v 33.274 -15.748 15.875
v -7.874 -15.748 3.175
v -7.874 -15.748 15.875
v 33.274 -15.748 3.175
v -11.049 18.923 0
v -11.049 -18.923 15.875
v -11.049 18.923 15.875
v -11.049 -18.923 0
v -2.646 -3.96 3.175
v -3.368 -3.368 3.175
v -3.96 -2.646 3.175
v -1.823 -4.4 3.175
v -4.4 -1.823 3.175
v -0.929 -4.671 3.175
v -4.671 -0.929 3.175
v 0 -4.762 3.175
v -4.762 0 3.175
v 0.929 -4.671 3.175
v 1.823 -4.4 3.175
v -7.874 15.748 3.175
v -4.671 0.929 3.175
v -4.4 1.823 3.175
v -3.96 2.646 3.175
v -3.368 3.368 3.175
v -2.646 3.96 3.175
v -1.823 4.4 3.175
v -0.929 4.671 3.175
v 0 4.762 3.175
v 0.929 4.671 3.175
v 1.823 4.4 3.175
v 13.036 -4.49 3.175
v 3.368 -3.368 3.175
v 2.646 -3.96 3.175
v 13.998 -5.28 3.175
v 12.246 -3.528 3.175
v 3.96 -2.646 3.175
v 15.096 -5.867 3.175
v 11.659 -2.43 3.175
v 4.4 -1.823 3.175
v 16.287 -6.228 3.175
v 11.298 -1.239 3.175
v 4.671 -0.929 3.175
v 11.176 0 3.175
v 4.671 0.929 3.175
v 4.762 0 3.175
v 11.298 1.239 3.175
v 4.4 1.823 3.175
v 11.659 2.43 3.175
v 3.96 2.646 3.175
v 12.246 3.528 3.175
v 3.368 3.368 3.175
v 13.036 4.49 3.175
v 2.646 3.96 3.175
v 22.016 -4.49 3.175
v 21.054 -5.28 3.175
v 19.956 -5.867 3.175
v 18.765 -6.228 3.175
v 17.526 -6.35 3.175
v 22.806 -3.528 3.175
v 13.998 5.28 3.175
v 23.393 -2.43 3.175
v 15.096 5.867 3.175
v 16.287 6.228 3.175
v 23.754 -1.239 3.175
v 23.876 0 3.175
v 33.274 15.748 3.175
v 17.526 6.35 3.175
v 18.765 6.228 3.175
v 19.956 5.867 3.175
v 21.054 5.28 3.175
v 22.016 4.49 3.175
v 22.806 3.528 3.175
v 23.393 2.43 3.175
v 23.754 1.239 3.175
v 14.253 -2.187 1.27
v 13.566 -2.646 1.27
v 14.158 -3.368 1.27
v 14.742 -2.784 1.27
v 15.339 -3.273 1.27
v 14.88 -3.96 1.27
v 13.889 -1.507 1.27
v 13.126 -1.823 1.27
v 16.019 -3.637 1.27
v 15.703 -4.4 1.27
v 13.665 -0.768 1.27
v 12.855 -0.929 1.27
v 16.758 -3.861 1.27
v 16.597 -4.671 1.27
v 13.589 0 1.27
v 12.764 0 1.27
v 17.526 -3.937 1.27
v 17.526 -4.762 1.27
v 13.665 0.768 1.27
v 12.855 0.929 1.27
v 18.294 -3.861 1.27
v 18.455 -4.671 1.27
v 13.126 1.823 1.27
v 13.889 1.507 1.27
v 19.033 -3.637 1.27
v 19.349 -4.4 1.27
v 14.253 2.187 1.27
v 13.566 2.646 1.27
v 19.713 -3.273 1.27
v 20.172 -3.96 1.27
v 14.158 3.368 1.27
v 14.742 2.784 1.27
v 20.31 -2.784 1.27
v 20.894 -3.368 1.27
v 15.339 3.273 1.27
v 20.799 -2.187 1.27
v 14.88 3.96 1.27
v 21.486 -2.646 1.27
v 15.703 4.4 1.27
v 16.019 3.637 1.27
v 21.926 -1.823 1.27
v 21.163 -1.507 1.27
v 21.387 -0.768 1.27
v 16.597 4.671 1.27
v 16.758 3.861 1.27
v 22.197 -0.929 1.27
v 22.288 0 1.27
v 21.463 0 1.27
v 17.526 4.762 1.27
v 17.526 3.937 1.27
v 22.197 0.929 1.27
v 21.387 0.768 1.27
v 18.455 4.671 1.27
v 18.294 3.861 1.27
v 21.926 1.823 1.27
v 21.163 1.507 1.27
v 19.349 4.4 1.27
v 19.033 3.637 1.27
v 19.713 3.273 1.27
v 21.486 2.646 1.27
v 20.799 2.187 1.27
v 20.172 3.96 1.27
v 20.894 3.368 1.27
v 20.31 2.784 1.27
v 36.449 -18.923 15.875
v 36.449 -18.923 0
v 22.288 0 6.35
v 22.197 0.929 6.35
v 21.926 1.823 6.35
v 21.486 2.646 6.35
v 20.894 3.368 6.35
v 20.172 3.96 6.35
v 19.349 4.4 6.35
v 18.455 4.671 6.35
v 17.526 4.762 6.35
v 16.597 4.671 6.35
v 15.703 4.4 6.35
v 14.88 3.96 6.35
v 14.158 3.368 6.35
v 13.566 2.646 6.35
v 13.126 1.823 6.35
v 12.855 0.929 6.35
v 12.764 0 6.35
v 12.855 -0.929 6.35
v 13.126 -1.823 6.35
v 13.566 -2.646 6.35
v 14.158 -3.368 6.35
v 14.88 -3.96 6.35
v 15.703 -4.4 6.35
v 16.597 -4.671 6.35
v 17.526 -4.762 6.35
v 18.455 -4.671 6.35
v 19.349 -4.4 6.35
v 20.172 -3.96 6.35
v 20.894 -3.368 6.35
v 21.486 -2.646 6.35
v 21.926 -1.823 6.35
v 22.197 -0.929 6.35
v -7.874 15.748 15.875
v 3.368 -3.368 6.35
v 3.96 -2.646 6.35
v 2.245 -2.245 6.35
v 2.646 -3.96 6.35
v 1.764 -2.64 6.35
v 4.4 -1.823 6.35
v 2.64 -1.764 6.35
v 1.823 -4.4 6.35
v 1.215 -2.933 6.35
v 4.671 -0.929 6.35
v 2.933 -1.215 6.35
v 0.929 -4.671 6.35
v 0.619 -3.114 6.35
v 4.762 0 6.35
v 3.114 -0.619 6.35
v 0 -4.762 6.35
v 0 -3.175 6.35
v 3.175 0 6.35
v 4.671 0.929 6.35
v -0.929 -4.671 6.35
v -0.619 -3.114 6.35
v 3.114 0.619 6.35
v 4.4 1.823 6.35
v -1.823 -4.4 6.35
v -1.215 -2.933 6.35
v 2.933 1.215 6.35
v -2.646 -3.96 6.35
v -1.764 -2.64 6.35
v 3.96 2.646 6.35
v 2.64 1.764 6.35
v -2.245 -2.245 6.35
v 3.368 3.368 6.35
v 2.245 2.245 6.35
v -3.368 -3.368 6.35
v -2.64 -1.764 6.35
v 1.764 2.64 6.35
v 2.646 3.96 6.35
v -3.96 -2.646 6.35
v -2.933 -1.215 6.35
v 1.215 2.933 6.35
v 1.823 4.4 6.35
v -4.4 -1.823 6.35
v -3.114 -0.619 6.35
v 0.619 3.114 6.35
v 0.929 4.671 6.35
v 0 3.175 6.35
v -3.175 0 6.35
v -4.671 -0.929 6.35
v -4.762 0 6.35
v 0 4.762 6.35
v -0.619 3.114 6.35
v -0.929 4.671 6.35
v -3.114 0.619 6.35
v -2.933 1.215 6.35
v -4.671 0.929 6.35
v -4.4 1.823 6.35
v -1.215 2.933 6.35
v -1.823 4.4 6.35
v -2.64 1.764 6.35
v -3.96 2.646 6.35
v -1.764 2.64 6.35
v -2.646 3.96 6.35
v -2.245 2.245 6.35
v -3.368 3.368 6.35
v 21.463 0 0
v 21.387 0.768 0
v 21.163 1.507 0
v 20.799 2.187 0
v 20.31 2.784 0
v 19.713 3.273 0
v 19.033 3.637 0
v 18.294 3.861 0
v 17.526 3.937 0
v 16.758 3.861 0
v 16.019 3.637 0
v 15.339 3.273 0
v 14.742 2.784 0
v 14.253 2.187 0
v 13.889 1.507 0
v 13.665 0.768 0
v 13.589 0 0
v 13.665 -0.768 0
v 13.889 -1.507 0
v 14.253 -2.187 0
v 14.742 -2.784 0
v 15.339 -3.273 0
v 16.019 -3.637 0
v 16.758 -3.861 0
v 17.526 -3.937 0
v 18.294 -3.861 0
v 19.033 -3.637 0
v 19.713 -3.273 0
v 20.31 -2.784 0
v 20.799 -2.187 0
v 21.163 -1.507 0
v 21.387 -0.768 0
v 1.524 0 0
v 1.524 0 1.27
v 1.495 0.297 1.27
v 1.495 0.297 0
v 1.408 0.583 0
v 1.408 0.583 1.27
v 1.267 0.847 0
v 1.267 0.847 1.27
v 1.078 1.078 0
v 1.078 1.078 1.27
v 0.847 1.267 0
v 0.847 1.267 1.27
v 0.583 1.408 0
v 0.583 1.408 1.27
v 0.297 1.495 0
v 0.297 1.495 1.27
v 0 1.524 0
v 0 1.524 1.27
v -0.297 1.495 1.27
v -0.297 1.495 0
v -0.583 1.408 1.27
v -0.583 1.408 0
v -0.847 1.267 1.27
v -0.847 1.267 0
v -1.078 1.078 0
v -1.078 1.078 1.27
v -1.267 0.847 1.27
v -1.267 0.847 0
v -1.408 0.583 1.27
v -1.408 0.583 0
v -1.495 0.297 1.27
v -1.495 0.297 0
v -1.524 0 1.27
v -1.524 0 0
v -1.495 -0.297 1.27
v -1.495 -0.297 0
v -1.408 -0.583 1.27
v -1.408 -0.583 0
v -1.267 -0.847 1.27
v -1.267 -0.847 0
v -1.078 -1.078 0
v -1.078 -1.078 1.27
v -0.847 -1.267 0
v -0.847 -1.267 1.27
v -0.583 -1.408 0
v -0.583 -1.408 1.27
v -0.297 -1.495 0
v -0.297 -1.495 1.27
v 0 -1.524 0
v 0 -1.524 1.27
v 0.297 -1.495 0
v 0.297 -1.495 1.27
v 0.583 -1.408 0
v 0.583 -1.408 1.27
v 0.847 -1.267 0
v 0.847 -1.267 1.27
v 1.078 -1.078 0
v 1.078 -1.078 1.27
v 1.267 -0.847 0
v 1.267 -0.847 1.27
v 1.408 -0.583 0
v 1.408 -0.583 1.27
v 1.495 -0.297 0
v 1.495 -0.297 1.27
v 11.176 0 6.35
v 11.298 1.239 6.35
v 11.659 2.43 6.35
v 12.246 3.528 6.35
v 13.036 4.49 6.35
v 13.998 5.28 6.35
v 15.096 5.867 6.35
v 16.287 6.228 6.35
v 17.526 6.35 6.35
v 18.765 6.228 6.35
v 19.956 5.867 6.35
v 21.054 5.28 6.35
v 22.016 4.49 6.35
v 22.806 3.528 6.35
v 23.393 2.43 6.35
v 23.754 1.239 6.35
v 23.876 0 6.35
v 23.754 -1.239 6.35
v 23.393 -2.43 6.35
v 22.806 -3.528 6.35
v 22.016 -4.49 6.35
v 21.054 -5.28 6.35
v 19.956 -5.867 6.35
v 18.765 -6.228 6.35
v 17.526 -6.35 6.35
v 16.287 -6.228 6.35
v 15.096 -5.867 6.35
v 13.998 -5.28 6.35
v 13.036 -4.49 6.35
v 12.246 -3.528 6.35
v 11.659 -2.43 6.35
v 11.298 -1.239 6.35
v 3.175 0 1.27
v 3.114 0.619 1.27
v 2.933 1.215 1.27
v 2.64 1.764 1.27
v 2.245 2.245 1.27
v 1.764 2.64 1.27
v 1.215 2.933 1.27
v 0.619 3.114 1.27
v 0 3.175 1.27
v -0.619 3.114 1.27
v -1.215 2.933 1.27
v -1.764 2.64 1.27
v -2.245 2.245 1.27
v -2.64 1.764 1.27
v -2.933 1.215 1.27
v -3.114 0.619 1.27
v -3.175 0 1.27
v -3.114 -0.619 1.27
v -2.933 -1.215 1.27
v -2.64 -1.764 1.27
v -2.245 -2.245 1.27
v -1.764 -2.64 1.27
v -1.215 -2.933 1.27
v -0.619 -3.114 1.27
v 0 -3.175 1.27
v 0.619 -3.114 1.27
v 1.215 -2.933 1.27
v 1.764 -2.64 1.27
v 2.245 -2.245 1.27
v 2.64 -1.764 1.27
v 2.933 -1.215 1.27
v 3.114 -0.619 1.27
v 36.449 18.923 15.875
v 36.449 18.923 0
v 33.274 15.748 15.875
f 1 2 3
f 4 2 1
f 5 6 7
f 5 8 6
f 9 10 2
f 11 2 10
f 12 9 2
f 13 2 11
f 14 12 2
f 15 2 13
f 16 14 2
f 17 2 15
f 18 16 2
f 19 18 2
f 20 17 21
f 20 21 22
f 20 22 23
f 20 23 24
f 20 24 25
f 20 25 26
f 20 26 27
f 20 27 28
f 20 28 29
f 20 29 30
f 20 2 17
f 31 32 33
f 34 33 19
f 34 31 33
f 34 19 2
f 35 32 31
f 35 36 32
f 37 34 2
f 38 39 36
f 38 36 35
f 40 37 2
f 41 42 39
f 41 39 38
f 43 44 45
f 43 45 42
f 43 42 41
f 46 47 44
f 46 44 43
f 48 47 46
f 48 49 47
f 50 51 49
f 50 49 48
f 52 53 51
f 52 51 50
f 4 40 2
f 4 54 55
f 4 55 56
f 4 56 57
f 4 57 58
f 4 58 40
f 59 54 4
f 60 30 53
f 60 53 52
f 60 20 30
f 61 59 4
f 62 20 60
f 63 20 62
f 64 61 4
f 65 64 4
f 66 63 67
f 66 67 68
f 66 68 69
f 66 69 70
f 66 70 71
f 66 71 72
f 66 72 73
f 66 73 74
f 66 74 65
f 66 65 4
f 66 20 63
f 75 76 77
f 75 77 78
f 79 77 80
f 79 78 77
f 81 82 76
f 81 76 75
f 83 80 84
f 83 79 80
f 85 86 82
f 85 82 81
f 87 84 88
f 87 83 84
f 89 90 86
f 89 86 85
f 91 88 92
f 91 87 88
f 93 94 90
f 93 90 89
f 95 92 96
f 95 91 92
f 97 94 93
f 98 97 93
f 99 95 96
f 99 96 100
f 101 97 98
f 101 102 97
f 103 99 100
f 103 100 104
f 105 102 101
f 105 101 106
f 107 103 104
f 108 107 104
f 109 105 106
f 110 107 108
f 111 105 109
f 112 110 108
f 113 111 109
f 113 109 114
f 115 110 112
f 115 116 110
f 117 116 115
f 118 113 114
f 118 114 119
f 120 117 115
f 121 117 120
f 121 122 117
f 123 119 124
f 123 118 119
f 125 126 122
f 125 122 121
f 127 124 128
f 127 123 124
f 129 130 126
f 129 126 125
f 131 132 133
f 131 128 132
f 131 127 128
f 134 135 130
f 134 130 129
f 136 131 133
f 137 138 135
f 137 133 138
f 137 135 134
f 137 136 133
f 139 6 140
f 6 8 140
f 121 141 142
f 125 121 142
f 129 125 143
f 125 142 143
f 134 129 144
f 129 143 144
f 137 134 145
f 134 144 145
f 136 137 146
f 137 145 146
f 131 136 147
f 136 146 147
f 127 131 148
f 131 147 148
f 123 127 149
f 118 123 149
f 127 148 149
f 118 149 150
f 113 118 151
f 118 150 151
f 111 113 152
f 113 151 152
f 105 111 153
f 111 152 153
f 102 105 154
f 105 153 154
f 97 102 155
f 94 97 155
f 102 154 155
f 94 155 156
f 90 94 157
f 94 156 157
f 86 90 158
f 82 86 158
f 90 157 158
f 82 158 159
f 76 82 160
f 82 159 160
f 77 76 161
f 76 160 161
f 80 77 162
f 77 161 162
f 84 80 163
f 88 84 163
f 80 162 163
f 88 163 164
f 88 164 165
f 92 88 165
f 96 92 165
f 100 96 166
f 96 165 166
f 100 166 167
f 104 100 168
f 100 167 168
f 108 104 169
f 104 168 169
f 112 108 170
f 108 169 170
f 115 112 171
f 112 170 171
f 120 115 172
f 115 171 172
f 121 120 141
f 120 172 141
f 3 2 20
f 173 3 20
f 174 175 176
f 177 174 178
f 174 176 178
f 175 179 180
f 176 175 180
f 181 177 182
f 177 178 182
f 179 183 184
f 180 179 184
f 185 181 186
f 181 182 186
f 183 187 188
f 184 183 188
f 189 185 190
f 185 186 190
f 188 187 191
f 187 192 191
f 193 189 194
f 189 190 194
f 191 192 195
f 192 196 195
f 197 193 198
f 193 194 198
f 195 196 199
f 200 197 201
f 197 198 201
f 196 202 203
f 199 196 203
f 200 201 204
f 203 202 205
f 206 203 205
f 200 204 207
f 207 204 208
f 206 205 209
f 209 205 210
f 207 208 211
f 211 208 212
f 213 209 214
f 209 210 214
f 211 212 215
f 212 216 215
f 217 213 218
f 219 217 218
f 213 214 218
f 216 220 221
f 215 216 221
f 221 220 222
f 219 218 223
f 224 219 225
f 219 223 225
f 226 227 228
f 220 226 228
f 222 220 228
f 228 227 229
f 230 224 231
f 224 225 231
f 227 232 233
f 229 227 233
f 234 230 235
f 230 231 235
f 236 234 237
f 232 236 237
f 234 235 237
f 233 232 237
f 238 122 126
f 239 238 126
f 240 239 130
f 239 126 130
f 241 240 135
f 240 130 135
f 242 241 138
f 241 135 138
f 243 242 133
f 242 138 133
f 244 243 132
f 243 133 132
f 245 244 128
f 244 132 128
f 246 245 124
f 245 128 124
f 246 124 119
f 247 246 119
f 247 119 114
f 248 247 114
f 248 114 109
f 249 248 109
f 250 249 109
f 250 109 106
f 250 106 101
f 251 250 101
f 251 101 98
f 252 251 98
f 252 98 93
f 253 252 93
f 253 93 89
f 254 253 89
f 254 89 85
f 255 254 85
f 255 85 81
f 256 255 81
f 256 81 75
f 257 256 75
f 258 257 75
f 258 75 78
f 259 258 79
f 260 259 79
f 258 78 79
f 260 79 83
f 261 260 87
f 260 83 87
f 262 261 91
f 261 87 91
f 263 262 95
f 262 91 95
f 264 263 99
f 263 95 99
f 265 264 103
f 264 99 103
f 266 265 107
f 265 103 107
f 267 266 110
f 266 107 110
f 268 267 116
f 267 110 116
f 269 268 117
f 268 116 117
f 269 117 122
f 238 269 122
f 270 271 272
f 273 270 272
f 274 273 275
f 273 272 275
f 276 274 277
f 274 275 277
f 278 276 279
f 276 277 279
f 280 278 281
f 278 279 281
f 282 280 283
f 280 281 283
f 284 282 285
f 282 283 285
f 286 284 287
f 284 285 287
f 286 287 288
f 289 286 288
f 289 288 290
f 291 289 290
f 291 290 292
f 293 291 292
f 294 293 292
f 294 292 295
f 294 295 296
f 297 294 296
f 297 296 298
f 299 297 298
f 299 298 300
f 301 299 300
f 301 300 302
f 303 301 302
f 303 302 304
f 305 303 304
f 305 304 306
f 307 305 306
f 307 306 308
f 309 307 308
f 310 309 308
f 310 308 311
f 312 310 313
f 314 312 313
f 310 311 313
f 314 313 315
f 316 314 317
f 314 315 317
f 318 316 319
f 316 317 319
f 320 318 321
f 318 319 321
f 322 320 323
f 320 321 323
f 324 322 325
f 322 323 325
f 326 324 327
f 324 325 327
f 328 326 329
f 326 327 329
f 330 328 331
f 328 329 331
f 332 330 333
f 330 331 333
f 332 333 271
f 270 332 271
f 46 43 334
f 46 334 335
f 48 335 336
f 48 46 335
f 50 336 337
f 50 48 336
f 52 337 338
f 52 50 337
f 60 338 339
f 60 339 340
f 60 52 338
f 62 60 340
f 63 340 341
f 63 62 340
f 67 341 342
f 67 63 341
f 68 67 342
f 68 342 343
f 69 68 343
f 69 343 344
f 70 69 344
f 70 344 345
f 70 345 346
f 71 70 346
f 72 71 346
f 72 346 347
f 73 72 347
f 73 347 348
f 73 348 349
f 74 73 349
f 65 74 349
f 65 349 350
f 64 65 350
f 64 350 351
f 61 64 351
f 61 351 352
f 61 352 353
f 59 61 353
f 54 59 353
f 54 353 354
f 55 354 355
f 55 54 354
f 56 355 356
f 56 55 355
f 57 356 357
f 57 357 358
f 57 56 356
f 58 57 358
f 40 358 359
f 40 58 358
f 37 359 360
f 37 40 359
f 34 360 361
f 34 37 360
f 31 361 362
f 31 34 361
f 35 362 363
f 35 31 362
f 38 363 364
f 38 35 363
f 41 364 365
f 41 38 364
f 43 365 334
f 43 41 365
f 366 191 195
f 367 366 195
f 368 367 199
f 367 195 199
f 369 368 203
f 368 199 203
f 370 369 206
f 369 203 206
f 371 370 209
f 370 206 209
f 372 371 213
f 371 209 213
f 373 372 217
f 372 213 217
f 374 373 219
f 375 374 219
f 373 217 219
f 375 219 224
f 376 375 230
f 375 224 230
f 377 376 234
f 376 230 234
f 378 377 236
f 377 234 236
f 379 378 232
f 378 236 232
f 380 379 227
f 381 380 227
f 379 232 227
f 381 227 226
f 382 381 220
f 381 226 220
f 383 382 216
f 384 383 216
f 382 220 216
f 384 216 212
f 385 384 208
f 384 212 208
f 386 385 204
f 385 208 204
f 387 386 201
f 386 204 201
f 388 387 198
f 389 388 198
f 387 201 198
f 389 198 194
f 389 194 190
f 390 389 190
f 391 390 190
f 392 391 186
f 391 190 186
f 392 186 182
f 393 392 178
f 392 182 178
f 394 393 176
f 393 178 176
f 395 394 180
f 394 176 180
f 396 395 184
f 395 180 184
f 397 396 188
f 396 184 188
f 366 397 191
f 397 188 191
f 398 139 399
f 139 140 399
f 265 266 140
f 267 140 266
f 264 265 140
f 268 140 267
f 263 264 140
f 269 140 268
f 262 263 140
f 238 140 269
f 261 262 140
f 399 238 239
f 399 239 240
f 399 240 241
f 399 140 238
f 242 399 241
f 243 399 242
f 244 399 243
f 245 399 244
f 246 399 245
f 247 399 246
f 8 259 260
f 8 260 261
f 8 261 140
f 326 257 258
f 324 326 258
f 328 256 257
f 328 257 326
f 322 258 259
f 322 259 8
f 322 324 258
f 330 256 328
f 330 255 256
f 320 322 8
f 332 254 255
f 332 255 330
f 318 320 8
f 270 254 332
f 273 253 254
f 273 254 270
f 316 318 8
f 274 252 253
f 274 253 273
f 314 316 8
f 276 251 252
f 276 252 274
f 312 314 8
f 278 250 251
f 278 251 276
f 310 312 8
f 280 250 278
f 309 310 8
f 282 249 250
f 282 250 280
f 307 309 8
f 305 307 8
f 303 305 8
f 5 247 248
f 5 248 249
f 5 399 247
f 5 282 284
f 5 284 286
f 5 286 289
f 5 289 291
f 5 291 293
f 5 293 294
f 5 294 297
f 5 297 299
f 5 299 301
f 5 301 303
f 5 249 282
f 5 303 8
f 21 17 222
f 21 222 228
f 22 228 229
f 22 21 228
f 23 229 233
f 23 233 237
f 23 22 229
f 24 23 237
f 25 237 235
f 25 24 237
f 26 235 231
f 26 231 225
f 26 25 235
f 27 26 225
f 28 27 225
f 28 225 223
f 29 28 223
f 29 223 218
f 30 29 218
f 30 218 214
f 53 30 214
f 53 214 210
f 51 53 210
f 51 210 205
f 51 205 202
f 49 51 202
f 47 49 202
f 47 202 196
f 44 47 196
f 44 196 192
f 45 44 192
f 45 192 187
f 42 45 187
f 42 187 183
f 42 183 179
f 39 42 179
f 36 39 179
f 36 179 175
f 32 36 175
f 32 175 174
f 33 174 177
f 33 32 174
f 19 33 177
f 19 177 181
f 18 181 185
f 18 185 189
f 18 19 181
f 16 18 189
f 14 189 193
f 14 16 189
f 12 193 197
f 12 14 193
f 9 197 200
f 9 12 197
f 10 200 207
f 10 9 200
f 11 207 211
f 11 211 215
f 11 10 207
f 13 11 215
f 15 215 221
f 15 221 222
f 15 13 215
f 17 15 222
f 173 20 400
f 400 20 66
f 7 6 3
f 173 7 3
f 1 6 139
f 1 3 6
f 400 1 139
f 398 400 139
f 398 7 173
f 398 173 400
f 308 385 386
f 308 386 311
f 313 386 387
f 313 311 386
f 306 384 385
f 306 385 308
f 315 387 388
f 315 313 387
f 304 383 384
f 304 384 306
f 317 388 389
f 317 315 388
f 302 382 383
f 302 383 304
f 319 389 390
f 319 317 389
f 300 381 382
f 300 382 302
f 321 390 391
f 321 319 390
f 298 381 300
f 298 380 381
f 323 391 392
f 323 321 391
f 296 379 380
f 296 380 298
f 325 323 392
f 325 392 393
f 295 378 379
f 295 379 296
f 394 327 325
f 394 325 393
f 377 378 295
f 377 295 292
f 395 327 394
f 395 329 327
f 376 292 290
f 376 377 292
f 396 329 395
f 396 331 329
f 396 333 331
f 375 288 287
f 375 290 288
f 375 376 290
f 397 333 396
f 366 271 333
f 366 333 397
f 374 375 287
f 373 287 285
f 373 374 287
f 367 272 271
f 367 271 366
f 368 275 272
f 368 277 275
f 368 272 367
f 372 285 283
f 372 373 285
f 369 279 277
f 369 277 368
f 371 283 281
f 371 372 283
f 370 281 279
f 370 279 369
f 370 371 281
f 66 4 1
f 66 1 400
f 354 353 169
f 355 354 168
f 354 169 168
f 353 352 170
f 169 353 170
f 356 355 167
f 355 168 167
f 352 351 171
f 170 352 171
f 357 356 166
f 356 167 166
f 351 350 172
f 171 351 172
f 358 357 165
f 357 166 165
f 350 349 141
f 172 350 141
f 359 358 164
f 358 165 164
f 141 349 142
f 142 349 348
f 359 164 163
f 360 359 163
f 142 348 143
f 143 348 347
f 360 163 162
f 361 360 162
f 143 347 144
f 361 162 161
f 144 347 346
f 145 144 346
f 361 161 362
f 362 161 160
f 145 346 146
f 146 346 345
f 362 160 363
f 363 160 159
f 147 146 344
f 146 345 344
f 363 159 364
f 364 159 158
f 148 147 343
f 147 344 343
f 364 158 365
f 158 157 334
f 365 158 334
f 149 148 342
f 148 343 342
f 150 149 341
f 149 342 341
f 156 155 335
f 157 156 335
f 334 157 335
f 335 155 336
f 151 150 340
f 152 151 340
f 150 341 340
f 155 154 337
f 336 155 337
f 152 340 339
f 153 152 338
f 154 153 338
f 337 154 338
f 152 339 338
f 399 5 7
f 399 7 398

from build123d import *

# Parameters (mm, degrees)
SKETCH2_W           = 47.498
SKETCH2_H           = 37.846
BOSS_EXTRUDE1_DEPTH = 3.175
SKETCH4_W           = 47.498
SKETCH4_H           = 37.846
SKETCH4_W_2         = 41.148
SKETCH4_H_2         = 31.496
BOSS_EXTRUDE2_DEPTH = 12.7
SKETCH5_R           = 4.7625
SKETCH5_R_2         = 6.35
BOSS_EXTRUDE3_DEPTH = 6.35
SKETCH6_R           = 4.7625
SKETCH6_R_2         = 3.175
CUT_EXTRUDE1_DEPTH  = 5.08
SKETCH7_R           = 1.524
SKETCH7_R_2         = 3.937
CUT_EXTRUDE2_DEPTH  = 43.987201933


with BuildPart() as part:
    # Sketch2 → Boss-Extrude1 (new body)
    with BuildSketch(Plane.XY):
        with Locations((12.7, 0)):
            Rectangle(SKETCH2_W, SKETCH2_H)
    extrude(amount=BOSS_EXTRUDE1_DEPTH)

    # Sketch4 → Boss-Extrude2 (add)
    with BuildSketch(Plane.XY.offset(3.175)):
        with Locations((12.7, 0)):
            Rectangle(SKETCH4_W, SKETCH4_H)
        with Locations((12.7, 0)):
            Rectangle(SKETCH4_W_2, SKETCH4_H_2, mode=Mode.SUBTRACT)
    extrude(amount=BOSS_EXTRUDE2_DEPTH)

    # Sketch5 → Boss-Extrude3 (add)
    with BuildSketch(Plane(origin=(0, 0, 0), x_dir=(-1, 0, 0), z_dir=(0, 0, -1))):
        Circle(SKETCH5_R)
        with Locations((-17.526, 0)):
            Circle(SKETCH5_R_2)
    extrude(amount=-BOSS_EXTRUDE3_DEPTH)

    # Sketch6 → Cut-Extrude1 (cut)
    with BuildSketch(Plane.XY.offset(6.35)):
        with Locations((17.526, 0)):
            Circle(SKETCH6_R)
        Circle(SKETCH6_R_2)
    extrude(amount=-CUT_EXTRUDE1_DEPTH, mode=Mode.SUBTRACT)

    # Sketch7 → Cut-Extrude2 (cut, through all)
    with BuildSketch(Plane.XY.offset(3.175)):
        Circle(SKETCH7_R)
        with Locations((17.526, 0)):
            Circle(SKETCH7_R_2)
    extrude(amount=-CUT_EXTRUDE2_DEPTH, mode=Mode.SUBTRACT)


solid = part.part
